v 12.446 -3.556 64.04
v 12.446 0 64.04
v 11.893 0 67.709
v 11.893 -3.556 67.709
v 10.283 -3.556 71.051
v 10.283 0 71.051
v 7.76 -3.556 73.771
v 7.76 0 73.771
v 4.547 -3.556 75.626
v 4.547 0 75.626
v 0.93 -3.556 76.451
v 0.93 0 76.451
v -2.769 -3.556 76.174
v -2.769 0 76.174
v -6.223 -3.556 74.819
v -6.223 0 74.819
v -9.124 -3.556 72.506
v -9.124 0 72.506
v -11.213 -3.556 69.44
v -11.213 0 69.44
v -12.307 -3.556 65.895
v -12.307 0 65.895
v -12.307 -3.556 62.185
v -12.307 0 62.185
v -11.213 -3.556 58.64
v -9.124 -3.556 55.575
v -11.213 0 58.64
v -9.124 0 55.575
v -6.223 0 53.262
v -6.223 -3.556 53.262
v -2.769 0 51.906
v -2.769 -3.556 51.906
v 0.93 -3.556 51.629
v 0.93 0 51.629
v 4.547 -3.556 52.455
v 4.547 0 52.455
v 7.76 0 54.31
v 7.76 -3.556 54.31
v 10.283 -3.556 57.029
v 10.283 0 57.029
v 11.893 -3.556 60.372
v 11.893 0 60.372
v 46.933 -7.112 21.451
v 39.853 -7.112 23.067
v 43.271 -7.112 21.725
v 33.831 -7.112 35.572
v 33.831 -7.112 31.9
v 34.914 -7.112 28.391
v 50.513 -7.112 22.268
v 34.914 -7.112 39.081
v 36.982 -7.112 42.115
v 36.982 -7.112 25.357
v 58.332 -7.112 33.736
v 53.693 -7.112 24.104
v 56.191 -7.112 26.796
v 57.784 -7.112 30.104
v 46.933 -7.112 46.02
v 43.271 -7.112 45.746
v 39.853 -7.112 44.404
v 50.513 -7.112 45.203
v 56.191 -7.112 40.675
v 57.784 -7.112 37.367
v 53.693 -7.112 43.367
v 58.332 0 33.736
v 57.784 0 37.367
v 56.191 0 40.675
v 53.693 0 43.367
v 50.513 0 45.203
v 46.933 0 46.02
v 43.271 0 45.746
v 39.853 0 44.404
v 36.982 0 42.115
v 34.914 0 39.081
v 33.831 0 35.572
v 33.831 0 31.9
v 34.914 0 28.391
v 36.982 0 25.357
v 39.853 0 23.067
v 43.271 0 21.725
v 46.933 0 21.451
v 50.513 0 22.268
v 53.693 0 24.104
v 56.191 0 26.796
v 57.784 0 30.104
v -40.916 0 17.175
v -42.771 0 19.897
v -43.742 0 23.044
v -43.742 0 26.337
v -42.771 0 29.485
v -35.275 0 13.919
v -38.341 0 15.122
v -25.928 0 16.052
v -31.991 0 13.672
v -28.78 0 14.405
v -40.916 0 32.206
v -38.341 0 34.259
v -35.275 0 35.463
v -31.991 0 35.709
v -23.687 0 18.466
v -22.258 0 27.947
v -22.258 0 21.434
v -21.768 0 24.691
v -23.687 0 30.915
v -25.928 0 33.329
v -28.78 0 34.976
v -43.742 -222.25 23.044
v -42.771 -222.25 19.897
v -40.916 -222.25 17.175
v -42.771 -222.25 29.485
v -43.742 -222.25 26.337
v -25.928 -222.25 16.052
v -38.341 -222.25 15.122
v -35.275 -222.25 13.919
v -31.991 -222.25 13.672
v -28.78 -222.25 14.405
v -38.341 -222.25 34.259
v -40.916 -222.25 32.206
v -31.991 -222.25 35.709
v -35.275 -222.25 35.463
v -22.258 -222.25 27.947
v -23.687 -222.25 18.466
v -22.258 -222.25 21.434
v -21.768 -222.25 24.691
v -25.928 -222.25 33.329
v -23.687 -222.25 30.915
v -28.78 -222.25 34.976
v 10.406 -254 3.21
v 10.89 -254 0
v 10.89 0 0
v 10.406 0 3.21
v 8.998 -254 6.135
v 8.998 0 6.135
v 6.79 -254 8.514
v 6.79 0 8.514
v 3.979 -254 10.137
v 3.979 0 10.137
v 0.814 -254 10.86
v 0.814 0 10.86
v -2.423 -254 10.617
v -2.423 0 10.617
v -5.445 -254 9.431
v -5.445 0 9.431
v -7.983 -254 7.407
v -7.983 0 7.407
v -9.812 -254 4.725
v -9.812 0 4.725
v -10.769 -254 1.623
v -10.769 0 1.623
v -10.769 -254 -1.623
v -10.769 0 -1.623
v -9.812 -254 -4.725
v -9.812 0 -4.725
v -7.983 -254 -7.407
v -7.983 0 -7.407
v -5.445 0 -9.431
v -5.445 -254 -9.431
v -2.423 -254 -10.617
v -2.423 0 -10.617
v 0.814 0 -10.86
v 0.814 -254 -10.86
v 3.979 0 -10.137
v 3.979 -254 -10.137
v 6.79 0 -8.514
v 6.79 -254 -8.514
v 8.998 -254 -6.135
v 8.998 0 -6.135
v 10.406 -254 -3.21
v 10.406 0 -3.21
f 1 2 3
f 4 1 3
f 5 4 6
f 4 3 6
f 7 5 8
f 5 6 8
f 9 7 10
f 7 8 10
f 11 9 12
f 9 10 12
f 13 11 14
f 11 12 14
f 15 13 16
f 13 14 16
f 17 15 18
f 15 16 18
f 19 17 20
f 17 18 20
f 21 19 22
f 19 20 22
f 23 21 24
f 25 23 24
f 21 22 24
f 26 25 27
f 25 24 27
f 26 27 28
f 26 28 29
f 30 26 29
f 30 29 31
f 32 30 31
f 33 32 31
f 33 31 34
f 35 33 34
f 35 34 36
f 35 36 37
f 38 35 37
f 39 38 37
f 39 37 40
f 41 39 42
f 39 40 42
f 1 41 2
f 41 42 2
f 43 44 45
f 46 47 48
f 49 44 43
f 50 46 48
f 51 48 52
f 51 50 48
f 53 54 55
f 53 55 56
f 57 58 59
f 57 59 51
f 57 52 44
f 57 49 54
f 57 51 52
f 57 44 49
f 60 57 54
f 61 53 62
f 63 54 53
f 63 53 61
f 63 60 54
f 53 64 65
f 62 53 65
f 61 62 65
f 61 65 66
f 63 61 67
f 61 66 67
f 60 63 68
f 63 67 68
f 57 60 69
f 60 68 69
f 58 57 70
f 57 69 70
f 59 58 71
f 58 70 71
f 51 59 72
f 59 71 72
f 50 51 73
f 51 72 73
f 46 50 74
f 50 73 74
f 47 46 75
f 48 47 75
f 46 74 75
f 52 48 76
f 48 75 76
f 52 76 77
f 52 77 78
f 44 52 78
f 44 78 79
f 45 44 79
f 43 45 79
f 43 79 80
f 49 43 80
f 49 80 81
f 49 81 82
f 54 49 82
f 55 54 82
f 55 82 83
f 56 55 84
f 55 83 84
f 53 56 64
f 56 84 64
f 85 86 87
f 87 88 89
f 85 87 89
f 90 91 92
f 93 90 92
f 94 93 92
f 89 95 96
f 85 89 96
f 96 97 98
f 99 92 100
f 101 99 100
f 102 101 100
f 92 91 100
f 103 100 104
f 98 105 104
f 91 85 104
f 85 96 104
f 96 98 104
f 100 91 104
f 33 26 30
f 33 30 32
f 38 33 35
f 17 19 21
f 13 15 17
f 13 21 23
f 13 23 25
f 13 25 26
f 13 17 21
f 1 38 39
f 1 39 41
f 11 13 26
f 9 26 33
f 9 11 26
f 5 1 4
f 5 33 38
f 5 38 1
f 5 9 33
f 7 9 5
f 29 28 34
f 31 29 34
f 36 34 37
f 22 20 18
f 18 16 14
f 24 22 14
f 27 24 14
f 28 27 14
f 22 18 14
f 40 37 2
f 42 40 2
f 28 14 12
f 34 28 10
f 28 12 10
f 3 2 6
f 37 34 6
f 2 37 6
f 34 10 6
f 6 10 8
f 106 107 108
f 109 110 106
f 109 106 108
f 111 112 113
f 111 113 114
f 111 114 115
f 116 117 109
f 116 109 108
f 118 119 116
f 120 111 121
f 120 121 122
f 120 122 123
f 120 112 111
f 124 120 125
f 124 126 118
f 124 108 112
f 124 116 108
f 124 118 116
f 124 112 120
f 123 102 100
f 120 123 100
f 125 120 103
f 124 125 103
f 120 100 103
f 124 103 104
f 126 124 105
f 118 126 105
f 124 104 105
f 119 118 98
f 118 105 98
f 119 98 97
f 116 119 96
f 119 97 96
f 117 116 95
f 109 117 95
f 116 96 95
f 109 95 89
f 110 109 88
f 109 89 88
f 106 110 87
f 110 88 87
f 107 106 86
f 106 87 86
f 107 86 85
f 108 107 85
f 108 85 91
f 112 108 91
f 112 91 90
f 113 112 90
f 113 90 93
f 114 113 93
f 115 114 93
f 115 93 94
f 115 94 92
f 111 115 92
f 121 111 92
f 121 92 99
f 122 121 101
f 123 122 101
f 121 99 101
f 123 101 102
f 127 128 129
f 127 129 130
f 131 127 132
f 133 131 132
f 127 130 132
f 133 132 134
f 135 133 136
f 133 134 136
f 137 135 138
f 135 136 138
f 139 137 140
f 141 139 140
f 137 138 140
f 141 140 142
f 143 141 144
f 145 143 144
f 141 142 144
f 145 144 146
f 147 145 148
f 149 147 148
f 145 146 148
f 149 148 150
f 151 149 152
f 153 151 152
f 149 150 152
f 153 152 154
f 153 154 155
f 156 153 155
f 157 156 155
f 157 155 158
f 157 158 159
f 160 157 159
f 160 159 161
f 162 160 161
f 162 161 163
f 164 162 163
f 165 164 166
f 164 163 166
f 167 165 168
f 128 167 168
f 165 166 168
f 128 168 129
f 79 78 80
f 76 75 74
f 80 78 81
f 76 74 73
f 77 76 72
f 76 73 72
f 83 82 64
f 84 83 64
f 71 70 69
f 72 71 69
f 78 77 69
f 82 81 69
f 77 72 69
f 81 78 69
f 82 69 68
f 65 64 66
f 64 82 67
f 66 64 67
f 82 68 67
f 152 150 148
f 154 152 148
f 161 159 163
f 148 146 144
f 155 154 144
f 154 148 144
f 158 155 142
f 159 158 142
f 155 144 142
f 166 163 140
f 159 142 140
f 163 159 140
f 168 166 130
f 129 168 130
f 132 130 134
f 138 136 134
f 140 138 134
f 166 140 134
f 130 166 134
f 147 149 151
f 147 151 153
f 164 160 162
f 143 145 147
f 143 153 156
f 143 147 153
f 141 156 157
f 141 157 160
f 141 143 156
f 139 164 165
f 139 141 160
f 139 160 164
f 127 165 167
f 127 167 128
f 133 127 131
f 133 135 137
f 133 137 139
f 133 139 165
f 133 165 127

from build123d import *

# Parameters (mm, degrees)
F0_R     = 10.89025
F1_DEPTH = 254
F2_R     = 11.049
F3_DEPTH = 222.25
F4_R     = 12.319
F5_DEPTH = 7.112
F6_R     = 12.446
F7_DEPTH = 3.556


with BuildPart() as f1:
    # F0 (on Front) → F1 (new body)
    with BuildSketch(Plane.XZ):
        Circle(F0_R)
    extrude(amount=F1_DEPTH)


with BuildPart() as f3:
    # F2 (on Front) → F3 (new body)
    with BuildSketch(Plane.XZ):
        with Locations((-32.816604, 24.690587)):
            Circle(F2_R)
    extrude(amount=F3_DEPTH)


with BuildPart() as f5:
    # F4 (on Front) → F5 (new body)
    with BuildSketch(Plane.XZ):
        with Locations((46.012603, 33.735577)):
            Circle(F4_R)
    extrude(amount=F5_DEPTH)


with BuildPart() as f7:
    # F6 (on Front) → F7 (new body)
    with BuildSketch(Plane.XZ):
        with Locations((0, 64.04026)):
            Circle(F6_R)
    extrude(amount=F7_DEPTH)


solid = Compound([f1.part, f3.part, f5.part, f7.part])
